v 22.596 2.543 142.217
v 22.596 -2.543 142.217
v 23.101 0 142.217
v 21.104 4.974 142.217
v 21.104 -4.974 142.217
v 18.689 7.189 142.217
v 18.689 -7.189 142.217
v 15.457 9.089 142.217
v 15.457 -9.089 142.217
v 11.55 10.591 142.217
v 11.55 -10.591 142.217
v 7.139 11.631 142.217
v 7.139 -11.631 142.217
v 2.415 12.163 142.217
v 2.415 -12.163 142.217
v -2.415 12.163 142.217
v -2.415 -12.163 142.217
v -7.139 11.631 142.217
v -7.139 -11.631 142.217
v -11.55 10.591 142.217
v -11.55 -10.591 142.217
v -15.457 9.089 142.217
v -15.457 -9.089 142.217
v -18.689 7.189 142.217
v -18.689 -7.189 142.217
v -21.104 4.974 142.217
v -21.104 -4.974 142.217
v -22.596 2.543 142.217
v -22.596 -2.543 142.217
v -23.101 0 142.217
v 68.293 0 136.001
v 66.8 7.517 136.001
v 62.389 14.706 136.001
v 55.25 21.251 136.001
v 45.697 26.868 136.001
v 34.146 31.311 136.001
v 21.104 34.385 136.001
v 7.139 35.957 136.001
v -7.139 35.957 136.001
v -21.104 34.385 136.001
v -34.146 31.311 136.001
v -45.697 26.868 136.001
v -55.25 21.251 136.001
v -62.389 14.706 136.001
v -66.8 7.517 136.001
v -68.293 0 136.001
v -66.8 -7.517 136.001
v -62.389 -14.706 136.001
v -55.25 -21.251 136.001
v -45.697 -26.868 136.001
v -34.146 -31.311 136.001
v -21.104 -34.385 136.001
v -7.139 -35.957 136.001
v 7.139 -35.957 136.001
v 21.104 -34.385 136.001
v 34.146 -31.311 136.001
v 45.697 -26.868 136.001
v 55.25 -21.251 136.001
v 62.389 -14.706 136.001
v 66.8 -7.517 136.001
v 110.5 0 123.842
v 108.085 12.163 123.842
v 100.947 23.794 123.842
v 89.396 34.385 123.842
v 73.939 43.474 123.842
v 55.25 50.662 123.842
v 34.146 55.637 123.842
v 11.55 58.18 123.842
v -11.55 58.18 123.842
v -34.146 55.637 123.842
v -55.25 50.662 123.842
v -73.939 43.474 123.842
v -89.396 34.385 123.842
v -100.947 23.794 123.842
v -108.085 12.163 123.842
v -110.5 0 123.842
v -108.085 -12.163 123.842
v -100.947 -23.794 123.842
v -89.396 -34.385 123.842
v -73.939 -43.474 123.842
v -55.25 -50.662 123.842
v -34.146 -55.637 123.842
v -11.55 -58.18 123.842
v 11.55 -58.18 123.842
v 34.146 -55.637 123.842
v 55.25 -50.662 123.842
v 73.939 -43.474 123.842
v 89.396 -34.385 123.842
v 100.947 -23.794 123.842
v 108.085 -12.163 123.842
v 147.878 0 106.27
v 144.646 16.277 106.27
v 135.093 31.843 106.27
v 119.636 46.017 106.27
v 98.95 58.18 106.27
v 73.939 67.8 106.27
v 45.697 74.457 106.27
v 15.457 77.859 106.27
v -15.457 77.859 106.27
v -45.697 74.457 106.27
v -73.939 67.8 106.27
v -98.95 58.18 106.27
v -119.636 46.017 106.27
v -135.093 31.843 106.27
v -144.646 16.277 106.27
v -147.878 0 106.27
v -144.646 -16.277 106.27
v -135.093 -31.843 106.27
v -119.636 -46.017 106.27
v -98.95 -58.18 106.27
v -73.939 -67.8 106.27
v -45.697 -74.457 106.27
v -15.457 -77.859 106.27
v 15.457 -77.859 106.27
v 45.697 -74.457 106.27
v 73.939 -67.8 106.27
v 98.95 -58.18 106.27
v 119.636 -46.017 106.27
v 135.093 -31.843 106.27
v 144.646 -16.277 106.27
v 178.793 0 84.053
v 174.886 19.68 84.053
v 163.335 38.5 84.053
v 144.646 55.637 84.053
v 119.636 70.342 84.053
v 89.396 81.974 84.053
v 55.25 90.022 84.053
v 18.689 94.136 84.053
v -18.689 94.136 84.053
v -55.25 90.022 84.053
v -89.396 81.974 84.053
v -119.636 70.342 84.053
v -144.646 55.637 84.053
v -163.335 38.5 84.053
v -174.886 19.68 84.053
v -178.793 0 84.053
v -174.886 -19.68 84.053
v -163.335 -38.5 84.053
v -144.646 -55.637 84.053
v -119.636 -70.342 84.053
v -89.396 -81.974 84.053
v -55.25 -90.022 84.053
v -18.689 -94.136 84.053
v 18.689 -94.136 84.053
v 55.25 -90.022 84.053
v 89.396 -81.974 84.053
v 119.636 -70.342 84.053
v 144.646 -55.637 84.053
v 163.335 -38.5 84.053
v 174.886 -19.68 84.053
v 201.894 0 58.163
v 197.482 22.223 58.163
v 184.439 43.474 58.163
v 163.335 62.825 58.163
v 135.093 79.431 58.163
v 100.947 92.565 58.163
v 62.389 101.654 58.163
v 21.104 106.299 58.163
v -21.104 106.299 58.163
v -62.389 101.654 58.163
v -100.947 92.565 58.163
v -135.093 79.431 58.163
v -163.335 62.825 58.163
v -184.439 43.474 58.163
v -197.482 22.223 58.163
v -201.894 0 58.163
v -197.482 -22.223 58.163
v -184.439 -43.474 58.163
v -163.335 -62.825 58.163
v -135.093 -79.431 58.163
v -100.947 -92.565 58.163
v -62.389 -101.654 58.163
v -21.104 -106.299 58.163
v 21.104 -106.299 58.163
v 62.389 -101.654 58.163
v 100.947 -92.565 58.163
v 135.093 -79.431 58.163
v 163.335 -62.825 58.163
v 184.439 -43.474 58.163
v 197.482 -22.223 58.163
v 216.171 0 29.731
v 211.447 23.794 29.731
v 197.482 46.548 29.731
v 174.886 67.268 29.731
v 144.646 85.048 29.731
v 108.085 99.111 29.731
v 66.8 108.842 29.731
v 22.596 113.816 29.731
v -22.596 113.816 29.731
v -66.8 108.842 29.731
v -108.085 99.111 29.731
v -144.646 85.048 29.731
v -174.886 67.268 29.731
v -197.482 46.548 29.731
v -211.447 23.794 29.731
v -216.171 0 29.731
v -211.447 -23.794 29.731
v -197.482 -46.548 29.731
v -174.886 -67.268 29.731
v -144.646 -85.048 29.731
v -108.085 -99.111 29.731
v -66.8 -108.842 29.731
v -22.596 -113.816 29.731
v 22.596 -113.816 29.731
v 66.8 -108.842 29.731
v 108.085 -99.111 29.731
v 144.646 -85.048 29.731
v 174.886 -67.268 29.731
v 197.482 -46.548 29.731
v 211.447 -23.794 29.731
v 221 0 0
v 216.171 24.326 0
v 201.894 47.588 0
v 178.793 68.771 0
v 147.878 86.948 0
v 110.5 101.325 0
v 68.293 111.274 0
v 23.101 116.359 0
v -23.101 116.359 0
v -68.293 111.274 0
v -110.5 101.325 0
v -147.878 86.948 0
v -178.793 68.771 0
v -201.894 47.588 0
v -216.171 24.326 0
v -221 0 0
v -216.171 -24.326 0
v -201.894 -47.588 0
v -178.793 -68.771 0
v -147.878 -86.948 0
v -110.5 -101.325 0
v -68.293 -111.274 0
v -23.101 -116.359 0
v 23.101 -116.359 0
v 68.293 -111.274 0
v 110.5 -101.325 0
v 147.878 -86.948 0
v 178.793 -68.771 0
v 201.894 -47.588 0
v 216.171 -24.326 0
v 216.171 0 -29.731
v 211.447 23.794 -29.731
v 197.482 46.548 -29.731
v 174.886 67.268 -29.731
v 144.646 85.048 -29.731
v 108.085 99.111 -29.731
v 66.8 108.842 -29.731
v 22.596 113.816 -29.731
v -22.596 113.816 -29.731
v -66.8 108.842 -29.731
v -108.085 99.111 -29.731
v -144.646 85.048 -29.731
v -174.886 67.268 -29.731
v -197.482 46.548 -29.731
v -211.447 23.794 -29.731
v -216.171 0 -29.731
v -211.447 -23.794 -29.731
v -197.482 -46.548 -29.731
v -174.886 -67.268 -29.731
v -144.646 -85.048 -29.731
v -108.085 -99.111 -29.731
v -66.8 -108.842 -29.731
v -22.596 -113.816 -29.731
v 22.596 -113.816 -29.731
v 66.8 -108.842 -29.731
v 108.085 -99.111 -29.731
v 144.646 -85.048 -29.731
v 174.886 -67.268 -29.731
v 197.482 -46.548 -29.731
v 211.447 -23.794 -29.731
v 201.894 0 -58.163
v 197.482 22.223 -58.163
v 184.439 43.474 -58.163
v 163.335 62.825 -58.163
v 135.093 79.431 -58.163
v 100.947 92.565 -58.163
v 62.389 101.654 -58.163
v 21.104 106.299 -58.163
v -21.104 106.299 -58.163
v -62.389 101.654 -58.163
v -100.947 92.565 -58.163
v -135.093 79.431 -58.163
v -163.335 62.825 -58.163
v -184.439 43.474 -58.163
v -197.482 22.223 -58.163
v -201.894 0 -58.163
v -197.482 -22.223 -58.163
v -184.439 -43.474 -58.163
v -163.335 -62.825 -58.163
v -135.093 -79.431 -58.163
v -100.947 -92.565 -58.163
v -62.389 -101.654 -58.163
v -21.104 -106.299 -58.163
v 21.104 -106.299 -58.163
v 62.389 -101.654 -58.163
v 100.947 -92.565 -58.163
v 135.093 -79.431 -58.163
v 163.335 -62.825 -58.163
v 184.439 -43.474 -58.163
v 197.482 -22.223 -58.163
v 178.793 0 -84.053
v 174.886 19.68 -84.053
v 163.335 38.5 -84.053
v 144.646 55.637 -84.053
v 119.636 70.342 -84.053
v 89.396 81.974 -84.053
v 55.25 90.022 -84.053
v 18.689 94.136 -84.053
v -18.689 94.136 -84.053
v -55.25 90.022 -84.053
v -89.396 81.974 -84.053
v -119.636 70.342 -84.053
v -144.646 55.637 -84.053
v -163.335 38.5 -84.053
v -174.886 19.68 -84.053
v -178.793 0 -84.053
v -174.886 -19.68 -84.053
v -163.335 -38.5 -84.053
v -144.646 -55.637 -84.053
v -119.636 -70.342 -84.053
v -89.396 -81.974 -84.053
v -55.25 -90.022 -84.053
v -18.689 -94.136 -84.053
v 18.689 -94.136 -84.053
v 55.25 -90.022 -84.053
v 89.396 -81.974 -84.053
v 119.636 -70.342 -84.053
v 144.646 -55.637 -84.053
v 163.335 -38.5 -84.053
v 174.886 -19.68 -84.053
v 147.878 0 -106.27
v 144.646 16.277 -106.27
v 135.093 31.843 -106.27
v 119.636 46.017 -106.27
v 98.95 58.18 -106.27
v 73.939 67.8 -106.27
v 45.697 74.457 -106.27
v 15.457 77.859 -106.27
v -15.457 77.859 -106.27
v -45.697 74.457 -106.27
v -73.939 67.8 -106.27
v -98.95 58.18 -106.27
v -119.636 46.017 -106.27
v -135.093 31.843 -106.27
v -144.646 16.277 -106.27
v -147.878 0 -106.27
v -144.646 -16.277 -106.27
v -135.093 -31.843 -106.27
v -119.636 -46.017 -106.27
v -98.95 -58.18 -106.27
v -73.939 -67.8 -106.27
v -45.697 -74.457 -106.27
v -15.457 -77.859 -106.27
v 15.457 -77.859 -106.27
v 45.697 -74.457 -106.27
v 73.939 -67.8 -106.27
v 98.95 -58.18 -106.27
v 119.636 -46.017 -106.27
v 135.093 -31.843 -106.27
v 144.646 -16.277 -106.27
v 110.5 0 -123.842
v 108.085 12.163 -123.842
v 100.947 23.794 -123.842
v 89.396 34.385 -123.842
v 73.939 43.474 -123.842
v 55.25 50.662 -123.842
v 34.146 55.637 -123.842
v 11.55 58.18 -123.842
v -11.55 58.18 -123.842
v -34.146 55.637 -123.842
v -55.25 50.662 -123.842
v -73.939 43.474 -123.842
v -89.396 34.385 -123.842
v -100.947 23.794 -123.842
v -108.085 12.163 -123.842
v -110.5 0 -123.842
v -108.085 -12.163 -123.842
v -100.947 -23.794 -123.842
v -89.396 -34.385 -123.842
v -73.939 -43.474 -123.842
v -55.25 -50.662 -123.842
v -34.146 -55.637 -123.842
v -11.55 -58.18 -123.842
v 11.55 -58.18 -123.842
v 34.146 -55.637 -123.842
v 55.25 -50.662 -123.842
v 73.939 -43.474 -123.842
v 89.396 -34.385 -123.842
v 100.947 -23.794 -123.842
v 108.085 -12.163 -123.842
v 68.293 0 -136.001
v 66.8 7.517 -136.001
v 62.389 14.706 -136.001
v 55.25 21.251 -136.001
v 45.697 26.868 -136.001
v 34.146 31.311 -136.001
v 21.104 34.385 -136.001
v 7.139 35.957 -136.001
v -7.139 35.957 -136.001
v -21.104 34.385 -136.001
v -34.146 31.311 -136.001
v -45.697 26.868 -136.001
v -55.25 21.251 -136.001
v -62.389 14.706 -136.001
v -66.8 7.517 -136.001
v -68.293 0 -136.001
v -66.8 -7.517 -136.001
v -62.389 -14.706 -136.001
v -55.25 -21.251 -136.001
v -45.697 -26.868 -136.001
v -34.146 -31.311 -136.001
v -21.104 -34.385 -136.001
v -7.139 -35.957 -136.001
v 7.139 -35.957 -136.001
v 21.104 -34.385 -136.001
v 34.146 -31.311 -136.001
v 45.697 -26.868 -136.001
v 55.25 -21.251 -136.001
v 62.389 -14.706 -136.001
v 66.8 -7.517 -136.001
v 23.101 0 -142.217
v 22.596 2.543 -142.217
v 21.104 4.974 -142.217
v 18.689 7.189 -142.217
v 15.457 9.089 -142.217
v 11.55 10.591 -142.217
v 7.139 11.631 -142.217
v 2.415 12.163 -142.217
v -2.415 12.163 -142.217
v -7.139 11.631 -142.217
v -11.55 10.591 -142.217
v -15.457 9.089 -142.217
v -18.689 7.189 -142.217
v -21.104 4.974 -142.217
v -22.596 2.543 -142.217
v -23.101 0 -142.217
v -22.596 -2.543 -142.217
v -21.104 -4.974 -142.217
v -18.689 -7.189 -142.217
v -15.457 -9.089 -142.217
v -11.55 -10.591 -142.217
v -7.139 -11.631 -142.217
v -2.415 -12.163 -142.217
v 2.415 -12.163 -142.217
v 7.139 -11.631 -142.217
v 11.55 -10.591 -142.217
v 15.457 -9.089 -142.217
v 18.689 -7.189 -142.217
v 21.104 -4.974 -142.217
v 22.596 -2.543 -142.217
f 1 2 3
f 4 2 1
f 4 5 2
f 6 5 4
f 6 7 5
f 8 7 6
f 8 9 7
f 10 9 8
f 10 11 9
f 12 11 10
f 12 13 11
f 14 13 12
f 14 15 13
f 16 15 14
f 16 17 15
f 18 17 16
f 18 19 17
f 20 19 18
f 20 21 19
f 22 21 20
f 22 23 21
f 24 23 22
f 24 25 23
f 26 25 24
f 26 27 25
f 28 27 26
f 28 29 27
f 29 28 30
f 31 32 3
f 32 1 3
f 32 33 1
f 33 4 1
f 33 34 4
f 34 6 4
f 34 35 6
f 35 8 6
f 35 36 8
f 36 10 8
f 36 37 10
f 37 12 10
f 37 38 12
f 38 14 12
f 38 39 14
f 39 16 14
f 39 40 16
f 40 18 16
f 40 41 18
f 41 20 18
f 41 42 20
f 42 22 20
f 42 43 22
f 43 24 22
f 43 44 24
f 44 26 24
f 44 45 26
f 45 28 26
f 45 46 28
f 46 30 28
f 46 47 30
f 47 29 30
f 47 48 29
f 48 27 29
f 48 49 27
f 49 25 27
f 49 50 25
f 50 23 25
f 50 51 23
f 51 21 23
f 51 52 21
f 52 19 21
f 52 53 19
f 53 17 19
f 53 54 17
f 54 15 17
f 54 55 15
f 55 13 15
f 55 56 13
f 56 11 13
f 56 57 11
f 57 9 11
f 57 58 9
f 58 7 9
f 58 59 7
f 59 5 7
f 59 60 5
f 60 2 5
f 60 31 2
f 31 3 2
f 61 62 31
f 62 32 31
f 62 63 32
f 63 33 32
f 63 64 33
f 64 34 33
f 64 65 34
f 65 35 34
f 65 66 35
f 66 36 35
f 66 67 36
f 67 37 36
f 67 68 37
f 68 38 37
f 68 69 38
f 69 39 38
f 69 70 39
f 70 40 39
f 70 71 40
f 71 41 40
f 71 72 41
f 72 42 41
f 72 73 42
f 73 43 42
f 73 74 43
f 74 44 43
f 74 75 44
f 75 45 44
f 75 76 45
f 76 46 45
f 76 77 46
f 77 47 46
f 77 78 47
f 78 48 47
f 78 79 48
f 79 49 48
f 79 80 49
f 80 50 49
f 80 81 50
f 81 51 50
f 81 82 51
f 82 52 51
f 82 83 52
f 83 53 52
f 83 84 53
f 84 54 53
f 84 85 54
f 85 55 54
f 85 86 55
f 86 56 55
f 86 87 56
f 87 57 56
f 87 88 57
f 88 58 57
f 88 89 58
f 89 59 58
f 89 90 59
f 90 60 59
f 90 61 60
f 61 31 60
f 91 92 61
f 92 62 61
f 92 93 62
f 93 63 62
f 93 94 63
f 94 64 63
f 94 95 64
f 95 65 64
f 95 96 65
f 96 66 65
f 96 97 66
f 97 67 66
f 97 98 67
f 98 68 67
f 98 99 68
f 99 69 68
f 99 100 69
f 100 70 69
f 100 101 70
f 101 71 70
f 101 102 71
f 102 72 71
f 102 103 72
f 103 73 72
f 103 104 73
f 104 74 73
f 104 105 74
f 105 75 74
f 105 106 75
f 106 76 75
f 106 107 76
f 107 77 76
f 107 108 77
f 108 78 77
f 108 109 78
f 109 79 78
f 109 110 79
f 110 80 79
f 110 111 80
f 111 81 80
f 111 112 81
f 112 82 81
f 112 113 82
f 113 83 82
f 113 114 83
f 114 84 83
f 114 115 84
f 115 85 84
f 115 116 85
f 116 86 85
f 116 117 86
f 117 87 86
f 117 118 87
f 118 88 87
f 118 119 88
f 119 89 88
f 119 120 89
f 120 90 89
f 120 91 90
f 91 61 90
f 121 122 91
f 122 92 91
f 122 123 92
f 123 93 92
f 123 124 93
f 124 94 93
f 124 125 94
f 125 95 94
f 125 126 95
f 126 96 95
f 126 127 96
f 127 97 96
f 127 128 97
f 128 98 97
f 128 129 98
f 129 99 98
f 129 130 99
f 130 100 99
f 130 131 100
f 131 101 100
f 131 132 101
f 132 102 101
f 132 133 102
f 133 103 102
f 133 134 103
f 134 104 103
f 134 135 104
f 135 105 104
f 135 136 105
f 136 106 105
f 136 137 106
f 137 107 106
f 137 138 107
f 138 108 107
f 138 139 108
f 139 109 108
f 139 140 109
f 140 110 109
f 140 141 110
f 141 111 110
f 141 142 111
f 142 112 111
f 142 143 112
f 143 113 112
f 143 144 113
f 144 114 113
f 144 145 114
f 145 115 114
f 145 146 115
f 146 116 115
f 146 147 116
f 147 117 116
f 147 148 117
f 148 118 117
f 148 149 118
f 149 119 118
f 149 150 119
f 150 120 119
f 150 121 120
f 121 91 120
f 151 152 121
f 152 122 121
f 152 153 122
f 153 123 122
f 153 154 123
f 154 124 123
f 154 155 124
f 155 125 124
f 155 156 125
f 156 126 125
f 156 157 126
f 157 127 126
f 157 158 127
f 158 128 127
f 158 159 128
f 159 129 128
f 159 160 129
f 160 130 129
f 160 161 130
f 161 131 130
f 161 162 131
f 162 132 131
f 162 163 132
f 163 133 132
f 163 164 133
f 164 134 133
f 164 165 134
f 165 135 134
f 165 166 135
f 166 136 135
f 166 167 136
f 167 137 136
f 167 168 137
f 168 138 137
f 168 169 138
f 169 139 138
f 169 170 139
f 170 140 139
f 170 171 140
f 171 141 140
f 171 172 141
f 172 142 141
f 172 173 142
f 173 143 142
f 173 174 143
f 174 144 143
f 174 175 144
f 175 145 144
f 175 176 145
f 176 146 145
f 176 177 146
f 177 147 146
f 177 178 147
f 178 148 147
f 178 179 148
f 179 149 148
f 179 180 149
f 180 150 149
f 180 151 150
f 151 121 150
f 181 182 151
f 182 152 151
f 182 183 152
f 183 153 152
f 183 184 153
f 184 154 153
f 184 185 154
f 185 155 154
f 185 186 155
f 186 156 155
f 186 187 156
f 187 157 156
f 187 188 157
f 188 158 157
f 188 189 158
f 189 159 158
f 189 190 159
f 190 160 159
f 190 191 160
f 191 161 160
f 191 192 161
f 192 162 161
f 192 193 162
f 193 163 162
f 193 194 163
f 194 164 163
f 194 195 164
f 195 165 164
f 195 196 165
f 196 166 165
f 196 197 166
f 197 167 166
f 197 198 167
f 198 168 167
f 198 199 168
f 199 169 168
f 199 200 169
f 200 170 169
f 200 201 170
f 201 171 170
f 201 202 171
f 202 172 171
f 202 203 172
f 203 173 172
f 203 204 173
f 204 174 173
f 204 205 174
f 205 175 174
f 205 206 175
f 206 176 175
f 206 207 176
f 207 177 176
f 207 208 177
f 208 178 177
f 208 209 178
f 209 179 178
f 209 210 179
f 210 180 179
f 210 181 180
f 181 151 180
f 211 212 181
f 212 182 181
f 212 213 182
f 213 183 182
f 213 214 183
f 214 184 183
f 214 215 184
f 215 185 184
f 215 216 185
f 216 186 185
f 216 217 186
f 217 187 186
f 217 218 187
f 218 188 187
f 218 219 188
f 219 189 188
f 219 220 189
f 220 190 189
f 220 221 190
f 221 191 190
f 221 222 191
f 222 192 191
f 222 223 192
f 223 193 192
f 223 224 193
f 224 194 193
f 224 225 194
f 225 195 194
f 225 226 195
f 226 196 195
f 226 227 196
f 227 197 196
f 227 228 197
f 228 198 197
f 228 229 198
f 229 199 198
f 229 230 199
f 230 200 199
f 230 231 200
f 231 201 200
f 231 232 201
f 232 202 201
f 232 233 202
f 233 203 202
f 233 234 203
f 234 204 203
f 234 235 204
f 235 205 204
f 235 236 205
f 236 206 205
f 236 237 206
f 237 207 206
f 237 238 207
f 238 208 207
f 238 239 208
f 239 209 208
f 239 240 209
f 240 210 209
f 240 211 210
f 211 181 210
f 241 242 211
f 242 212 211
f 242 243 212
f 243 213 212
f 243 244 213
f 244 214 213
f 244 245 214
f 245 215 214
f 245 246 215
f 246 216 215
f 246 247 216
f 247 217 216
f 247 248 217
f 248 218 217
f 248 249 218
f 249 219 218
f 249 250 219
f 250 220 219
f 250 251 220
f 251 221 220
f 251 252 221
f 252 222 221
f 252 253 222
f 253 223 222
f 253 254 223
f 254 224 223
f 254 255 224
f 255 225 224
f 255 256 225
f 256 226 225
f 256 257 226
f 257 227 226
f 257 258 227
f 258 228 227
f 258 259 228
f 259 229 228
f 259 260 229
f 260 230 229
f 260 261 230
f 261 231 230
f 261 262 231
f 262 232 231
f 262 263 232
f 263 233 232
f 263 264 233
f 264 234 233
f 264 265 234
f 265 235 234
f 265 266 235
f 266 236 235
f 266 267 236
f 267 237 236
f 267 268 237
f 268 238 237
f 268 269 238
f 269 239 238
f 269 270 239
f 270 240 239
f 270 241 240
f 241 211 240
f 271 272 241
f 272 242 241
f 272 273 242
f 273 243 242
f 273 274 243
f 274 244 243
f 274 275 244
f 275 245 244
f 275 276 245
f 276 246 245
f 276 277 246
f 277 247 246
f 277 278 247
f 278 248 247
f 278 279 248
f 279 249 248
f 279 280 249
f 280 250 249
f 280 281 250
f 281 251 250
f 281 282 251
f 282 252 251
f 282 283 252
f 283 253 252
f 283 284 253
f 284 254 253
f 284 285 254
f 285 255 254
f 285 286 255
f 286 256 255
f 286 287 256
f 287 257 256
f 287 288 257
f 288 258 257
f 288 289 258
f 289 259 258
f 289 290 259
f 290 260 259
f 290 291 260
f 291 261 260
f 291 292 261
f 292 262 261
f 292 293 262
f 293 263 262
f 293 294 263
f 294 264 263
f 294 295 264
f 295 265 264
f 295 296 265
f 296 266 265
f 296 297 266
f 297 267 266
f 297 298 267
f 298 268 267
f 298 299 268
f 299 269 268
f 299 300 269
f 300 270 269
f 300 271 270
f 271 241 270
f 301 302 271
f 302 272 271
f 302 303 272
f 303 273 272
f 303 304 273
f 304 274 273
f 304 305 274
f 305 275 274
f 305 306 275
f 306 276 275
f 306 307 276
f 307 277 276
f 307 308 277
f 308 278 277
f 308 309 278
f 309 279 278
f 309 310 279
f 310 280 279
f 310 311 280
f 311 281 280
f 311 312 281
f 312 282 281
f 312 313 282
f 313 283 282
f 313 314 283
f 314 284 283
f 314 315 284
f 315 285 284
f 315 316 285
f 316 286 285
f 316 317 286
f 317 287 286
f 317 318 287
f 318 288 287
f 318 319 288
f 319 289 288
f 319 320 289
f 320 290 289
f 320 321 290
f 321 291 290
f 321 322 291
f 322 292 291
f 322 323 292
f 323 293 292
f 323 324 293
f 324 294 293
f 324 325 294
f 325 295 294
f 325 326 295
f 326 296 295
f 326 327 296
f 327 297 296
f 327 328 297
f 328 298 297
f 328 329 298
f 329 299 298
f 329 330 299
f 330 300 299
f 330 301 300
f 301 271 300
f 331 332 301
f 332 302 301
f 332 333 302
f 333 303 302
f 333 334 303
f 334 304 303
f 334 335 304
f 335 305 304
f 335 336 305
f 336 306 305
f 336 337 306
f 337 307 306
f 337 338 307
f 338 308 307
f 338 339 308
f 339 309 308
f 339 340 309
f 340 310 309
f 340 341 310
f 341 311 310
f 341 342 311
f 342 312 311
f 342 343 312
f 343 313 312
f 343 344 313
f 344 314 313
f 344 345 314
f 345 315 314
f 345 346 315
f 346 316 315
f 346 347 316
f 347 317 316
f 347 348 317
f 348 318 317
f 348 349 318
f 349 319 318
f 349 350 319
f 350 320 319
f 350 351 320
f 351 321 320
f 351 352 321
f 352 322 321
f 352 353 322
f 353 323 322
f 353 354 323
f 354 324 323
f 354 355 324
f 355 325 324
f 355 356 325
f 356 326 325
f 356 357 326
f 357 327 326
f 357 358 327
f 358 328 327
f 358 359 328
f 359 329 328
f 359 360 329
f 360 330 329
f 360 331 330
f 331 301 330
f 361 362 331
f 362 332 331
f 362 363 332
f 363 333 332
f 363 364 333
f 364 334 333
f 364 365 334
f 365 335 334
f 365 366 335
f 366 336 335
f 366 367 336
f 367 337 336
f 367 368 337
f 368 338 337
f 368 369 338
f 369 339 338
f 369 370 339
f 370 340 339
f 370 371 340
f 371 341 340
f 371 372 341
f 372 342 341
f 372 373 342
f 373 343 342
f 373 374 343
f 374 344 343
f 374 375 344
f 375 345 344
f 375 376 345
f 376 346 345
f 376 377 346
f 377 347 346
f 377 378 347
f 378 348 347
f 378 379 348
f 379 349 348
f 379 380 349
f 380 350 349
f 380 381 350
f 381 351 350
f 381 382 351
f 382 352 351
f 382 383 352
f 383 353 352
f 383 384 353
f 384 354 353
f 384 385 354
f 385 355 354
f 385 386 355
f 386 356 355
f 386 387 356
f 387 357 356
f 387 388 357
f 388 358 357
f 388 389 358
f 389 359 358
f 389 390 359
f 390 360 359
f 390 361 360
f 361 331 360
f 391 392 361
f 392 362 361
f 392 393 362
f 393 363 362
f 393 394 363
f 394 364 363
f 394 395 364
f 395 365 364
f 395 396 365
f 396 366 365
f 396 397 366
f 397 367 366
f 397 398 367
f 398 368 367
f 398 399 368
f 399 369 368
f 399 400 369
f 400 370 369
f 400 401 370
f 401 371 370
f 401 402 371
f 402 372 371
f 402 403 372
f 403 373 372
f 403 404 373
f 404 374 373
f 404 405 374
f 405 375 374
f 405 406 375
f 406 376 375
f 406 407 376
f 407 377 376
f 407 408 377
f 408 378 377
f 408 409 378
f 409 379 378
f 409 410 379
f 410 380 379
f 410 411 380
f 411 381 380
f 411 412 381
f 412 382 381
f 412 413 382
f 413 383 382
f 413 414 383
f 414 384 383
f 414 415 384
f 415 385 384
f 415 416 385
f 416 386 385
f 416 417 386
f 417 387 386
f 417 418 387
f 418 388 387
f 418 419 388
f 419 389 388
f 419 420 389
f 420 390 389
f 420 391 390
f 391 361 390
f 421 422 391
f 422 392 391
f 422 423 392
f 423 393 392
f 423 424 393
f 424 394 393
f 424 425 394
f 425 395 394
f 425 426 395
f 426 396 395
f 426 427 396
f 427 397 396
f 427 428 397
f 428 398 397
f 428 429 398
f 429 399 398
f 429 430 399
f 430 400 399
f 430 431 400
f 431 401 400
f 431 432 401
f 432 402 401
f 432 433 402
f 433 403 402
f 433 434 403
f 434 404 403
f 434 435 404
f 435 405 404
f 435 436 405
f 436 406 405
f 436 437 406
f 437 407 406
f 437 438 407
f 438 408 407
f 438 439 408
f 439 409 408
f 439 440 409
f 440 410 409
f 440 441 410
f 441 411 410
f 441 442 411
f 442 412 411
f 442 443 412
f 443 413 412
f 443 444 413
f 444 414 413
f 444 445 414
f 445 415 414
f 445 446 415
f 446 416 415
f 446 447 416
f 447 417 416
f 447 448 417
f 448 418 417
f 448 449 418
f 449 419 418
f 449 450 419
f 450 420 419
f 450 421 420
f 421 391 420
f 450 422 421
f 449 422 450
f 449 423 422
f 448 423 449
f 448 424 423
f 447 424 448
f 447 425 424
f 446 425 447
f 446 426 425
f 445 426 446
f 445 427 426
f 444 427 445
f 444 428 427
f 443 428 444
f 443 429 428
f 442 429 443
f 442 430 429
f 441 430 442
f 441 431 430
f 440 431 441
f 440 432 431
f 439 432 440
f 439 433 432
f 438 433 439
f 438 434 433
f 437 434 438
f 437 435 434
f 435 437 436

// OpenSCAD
// Generated by SolidPython 1.0.1 on 2020-07-29 00:46:53


scale(v = [17, 9, 11]) {
	sphere(r = 13);
}
/***********************************************
*********      SolidPython code:      **********
************************************************
 
# import packages: SolidPython
from solid import *
from solid.utils import *
from itertools import chain, combinations, permutations


class Resize:

    def __init__(self, scad_file):
        self.scad_file = scad_file
        #self.scad_file = import_scad(scad_file)
        # cone/cylinder param:
        self.r1 = 0
        self.r2 = 0
        self.h = 0
        # rectangular prism param:
        self.w = 0
        self.l = 0
        # ellipse param:
        self.r = 0

    # import OpenScad code (file name corresponds to shape)


    # classify shape + parameters
    def assign(self, param1, param2, param3):
        if self.scad_file == 'cone.scad':
            self.r1 = param1
            self.r2 = param2
            self.h = param3
        elif self.scad_file == 'cylinder.scad':
            self.r1 = param1
            self.r2 = param2
            self.h = param3
        elif self.scad_file == 'rectangularPrism.scad':
            self.h = param1
            self.l = param2
            self.w = param3
        else:
            self.r = param1
            self.h = param2

    # resize parameters
    def iterate(self):
        x = range(3, 20, 2)
        i = 1
        if self.scad_file == 'cone.scad':
            tempList = list(permutations(x, 2))
            for temp in tempList:
                param1 = temp[0]
                param2 = temp[1]
                filepath = 'produced_scad_files/' + 'cone' + str(param1) + '_' + str(param2) + '_' + '.scad'
                scad_render_to_file(cylinder(h=param1, r1=param2, r2=0), filepath)

        elif self.scad_file == 'cylinder.scad':
            tempList = list(permutations(x, 3))
            for temp in tempList:
                param1 = temp[0]
                param2 = temp[1]
                filepath = 'produced_scad_files/' + 'cylinder' + str(param1) + '_' + str(param2) + '_' + '.scad'
                scad_render_to_file(cylinder(h=param1, r1=param2, r2=param2), filepath)

        elif self.scad_file == 'rectangularPrism.scad':
            tempList = list(permutations(x, 3))
            for temp in tempList:
                param1 = temp[0]
                param2 = temp[1]
                param3 = temp[2]
                filepath = 'produced_scad_files/' + 'rectangularPrism' + str(param1) + '_' + str(param2) + '_' + str(
                    param3) + '.scad'
                scad_render_to_file(cube(size=(param1, param2, param3)), filepath)

        elif self.scad_file == 'ellipse.scad':
            tempList = list(permutations(x, 4))
            for temp in tempList:
                param1 = temp[0]
                param2 = temp[1]
                param3 = temp[2]
                param4 = temp[3]
                filepath = 'produced_scad_files/' + 'ellipse' + str(param1) + '_' + str(param2) + '_' + str(param3) + '_' + str(param4) + '.scad'
                scad_render_to_file(scale([param1, param2, param3])(sphere(r=param4)), filepath)

    def render_to_scadfile(self):
        scad_render_to_file(scad, 'example.scad') 
 
************************************************/
